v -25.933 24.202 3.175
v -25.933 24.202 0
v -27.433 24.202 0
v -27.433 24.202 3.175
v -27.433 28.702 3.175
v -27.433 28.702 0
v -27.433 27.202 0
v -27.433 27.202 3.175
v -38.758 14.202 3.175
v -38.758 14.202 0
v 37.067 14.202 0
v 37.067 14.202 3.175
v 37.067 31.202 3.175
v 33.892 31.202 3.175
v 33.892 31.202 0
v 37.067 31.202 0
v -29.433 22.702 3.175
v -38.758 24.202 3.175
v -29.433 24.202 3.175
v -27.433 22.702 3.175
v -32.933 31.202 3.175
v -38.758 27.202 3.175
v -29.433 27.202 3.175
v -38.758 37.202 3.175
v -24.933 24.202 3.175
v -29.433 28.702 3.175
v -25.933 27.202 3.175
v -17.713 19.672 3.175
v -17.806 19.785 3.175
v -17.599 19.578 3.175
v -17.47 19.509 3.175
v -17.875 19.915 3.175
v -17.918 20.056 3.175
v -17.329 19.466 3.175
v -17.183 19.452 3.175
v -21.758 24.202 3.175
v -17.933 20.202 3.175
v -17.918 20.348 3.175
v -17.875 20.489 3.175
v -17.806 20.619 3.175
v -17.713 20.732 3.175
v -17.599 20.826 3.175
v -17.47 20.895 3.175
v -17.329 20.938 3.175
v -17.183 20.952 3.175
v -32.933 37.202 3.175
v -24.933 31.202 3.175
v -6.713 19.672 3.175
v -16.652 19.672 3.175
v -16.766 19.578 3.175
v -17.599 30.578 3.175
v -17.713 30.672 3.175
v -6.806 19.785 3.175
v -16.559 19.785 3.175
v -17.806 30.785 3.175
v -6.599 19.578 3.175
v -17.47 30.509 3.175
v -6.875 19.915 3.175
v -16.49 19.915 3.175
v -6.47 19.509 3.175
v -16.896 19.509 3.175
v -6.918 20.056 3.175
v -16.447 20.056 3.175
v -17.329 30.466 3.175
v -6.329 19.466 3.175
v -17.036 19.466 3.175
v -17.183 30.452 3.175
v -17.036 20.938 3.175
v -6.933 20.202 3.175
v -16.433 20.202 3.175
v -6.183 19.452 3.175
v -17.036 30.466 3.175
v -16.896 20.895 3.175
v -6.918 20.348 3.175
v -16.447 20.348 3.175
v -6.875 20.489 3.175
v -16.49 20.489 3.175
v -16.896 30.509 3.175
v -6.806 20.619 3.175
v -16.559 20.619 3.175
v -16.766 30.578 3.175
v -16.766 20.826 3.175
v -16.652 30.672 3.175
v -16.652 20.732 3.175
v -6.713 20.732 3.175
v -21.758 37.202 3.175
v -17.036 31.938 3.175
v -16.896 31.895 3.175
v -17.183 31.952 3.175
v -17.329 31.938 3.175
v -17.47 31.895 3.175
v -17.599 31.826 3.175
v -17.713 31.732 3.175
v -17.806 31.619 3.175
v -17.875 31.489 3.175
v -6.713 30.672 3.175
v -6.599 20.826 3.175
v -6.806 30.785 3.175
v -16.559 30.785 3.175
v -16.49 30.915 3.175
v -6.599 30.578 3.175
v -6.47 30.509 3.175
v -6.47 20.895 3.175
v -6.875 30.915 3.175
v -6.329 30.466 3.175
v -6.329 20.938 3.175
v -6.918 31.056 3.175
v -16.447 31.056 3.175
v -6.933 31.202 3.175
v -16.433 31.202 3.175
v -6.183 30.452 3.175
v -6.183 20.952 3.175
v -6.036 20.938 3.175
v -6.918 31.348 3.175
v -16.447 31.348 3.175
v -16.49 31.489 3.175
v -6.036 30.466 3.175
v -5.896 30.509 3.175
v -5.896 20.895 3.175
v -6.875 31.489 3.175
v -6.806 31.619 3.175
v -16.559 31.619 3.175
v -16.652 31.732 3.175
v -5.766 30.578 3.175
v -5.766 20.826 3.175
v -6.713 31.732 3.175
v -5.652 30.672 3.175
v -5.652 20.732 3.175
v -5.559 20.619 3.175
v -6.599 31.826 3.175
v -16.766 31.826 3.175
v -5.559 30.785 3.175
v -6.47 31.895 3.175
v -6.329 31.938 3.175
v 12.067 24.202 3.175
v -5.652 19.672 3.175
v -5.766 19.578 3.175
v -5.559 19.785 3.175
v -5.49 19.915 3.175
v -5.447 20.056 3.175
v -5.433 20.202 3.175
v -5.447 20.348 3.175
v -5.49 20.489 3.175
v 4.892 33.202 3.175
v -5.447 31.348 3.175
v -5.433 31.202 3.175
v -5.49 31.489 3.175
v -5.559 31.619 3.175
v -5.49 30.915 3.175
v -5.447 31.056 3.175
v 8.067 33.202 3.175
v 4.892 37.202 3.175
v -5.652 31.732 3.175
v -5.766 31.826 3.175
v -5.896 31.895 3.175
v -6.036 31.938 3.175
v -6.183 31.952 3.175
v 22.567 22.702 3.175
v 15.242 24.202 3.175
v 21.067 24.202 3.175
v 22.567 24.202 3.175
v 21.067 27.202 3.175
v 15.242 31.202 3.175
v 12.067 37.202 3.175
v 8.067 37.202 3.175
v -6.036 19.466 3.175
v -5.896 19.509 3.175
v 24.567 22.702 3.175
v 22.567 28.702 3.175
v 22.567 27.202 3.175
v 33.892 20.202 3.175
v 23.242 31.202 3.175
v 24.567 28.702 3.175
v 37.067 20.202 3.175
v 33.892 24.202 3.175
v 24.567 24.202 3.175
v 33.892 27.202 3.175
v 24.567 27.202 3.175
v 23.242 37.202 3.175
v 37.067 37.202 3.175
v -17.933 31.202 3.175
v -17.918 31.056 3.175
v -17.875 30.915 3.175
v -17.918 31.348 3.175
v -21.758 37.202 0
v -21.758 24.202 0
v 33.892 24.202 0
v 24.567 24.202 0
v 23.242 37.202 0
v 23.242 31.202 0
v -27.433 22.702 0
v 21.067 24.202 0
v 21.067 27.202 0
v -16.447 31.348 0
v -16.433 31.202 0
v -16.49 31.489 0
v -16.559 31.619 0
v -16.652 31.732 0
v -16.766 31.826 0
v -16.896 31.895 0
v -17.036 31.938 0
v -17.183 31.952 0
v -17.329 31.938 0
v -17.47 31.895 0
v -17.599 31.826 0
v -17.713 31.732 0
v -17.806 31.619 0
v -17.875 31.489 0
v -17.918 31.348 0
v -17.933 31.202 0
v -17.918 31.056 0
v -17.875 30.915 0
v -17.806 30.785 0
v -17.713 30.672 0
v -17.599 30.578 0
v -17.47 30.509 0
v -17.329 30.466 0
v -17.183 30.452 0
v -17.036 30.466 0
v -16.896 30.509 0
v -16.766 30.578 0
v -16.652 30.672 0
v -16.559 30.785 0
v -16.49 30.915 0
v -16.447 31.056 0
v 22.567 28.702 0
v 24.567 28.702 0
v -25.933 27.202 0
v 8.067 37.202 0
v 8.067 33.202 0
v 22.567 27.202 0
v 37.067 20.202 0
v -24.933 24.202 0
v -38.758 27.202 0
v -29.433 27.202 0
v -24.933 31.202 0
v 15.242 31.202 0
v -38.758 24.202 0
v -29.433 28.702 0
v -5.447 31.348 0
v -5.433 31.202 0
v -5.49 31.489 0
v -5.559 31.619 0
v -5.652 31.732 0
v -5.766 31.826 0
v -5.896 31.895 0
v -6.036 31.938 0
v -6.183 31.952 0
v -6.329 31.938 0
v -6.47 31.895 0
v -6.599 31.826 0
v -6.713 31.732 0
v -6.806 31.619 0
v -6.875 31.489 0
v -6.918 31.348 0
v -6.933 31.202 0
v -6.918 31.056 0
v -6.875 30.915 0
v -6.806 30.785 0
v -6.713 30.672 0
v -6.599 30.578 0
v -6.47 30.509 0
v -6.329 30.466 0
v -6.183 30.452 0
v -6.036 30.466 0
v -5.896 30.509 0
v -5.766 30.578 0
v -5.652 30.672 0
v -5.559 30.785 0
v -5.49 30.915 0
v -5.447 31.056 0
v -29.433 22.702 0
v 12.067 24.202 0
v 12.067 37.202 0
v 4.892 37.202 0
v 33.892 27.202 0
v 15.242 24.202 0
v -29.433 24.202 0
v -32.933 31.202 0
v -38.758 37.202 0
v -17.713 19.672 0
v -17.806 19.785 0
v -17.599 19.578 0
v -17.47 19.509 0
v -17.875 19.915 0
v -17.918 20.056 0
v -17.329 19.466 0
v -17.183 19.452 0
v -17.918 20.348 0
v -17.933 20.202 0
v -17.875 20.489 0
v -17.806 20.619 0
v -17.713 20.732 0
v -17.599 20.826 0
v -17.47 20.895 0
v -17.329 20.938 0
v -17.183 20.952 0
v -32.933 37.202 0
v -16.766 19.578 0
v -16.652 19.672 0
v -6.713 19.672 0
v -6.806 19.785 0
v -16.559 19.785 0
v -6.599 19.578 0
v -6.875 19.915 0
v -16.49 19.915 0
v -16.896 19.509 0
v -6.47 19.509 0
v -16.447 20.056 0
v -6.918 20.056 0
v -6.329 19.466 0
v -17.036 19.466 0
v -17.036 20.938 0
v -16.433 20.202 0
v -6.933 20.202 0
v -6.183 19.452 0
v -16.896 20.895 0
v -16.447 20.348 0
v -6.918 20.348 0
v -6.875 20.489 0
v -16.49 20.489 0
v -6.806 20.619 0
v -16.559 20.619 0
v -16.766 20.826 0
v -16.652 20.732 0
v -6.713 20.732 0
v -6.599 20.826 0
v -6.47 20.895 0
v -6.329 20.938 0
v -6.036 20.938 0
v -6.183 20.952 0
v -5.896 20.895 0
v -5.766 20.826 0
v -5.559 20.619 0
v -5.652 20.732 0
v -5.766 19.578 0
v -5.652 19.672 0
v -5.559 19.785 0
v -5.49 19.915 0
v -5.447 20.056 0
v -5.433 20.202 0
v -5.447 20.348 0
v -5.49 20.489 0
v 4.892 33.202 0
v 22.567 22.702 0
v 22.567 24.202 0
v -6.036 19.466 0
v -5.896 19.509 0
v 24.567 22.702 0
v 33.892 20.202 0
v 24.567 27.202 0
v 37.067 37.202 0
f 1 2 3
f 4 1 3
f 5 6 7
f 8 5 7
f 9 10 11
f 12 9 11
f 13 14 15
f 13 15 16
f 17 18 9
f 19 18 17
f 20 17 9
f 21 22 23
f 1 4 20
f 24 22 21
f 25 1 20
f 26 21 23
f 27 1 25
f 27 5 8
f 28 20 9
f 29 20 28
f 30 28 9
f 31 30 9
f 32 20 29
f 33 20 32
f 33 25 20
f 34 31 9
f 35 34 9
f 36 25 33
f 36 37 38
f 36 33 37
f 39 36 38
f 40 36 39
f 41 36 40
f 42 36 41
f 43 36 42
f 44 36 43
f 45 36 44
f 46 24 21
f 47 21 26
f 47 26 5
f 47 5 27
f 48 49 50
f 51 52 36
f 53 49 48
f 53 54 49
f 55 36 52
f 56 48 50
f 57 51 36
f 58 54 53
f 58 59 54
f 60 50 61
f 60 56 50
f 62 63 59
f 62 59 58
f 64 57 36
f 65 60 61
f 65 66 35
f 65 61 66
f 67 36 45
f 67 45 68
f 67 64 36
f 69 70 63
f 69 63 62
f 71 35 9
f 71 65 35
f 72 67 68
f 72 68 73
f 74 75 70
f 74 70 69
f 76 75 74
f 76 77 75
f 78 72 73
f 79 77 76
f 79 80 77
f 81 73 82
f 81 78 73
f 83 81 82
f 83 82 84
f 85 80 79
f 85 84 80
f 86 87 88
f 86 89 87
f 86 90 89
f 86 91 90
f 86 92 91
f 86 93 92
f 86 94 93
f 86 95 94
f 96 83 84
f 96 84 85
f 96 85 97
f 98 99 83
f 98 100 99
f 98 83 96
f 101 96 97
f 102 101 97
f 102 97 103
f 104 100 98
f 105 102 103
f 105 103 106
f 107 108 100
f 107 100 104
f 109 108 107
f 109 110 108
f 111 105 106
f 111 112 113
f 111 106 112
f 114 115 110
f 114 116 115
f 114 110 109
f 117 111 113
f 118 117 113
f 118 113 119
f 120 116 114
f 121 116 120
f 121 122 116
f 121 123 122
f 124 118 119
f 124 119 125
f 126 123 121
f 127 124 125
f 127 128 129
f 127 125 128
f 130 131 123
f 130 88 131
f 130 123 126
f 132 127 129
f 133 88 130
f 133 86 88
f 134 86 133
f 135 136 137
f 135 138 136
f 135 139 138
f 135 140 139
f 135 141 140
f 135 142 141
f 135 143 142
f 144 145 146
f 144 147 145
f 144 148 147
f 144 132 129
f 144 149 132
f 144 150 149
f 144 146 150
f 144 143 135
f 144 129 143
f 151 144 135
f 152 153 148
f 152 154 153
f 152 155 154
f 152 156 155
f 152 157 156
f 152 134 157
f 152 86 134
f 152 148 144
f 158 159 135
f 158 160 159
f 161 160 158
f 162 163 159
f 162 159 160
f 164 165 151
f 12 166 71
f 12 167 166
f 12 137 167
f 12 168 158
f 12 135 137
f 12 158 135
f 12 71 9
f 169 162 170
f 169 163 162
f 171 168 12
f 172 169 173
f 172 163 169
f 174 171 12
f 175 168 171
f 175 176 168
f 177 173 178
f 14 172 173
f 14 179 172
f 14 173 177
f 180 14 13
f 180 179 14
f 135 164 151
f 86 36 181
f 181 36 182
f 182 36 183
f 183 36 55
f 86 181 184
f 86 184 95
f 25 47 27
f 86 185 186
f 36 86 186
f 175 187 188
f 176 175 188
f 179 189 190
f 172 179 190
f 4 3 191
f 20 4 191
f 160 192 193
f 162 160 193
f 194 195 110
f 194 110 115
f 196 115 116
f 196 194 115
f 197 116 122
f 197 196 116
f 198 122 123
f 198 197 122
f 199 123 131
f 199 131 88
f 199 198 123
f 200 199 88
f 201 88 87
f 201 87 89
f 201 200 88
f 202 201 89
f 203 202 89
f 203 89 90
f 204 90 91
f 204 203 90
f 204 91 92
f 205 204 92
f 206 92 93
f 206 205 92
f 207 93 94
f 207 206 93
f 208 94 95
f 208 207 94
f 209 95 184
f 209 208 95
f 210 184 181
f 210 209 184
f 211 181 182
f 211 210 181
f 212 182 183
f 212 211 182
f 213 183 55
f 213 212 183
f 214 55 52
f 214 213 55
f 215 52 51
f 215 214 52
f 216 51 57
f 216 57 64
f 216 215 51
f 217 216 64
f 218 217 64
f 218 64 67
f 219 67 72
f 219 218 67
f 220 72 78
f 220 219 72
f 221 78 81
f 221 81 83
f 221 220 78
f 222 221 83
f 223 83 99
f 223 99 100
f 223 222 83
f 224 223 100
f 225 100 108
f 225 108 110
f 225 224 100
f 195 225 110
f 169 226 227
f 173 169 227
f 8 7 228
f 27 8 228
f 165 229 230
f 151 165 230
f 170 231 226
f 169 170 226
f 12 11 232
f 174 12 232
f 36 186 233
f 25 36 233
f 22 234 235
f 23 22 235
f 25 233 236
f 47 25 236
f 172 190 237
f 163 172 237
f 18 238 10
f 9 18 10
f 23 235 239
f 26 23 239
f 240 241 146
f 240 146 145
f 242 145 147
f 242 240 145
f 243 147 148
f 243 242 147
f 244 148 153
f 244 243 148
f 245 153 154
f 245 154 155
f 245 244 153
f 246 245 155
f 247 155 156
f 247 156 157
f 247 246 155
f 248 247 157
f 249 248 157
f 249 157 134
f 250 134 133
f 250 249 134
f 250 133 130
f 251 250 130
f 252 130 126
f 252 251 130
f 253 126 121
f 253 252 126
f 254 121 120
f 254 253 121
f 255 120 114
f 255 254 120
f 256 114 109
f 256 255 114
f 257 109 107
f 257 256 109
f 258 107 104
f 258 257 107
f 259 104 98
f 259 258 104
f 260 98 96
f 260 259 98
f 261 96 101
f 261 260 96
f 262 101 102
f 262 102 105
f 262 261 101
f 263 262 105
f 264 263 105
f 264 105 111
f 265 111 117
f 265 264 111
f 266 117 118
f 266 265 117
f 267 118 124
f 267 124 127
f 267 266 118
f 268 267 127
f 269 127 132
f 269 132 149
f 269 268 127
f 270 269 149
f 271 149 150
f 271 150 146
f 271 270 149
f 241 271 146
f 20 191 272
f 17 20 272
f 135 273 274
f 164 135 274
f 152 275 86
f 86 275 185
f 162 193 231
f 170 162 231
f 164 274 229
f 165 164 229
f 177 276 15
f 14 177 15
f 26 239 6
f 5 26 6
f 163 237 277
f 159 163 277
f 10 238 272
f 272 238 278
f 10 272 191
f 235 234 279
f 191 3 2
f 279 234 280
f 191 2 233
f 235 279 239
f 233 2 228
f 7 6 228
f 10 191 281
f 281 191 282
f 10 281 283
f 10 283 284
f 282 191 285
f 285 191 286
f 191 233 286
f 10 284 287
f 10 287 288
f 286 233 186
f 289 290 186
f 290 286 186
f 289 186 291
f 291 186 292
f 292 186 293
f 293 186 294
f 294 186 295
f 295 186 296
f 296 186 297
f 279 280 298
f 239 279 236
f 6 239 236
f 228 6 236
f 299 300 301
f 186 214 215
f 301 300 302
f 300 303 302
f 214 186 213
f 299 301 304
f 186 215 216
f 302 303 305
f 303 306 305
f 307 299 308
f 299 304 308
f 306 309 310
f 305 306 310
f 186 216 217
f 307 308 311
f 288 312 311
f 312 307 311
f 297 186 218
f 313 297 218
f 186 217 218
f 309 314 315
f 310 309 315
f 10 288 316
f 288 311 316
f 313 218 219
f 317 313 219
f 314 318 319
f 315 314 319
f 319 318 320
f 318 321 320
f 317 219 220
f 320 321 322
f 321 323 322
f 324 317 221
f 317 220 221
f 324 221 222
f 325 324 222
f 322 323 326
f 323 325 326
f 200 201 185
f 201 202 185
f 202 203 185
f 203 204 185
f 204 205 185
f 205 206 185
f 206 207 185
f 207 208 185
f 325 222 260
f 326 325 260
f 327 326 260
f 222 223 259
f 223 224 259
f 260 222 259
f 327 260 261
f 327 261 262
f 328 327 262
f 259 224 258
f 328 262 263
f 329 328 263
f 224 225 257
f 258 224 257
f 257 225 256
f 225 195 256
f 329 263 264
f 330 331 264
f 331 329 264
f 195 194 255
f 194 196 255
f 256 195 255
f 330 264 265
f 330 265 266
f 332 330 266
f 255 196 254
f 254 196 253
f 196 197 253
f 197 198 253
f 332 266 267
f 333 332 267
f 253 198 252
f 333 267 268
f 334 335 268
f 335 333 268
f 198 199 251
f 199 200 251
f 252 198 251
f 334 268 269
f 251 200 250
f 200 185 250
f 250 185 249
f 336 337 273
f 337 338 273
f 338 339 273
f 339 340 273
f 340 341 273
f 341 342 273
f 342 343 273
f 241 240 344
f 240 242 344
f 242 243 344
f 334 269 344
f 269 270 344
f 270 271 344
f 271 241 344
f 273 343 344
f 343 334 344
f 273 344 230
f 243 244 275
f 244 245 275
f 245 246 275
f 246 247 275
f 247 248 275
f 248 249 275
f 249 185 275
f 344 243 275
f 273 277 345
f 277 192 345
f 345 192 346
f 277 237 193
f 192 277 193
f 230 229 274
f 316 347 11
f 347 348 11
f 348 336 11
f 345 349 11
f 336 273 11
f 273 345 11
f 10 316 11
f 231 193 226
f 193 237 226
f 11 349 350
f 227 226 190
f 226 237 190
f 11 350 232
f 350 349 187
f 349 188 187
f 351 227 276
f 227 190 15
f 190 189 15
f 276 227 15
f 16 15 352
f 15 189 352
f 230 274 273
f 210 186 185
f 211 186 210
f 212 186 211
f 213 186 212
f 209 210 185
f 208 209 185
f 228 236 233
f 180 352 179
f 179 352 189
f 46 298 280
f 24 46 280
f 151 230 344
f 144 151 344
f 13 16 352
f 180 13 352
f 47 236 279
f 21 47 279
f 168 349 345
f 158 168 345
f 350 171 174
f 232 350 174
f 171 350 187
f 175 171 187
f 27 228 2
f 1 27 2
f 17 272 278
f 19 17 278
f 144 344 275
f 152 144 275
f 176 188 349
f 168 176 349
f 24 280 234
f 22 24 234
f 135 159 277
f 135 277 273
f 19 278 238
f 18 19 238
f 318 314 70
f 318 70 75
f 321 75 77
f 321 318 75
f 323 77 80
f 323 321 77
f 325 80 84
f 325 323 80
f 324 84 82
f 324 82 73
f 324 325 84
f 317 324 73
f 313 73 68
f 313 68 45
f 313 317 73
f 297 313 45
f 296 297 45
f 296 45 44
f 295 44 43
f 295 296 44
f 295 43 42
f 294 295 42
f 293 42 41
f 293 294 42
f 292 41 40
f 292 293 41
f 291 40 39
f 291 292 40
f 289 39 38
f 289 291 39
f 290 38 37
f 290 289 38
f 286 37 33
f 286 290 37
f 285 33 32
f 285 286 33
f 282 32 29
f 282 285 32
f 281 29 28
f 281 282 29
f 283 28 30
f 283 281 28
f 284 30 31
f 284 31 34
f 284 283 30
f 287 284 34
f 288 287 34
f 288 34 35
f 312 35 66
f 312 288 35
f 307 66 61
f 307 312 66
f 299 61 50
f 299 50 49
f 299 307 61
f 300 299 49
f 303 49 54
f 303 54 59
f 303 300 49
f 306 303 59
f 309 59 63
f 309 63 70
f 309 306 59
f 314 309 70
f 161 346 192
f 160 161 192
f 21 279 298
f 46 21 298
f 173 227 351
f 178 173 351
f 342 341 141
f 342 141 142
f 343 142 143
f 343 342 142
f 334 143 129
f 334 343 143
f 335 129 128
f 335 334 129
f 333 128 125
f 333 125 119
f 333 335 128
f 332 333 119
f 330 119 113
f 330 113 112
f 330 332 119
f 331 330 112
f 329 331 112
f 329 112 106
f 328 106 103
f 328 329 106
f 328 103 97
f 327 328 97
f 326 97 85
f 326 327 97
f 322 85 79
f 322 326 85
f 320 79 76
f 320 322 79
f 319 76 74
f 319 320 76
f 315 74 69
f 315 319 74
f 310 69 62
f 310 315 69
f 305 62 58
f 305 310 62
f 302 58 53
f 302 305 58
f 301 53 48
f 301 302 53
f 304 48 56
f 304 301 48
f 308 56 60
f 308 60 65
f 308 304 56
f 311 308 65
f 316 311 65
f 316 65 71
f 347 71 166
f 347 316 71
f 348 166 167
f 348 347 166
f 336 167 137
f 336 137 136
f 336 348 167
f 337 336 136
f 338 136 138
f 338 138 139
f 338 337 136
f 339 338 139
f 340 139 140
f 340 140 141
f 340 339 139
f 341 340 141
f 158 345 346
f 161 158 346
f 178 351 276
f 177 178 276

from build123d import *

# Parameters (mm, degrees)
F0_R     = 0.75
F0_W     = 3.175
F0_H     = 6
F1_DEPTH = 3.175


# Not quite as in the source:
# - a length typed as a fraction of an inch, garbled in the dataset ("3 / 203.2 mm" for 3/8 in), is restored


with BuildPart() as f1:
    # F0 (on Top) → F1 (new body)
    with BuildSketch(Plane.XY):
        Polygon((21.0674113333, 24.2020648569), (21.0674113333, 27.2020648569), (22.5674113333, 27.2020648569), (22.5674113333, 28.7020648569), (24.5674113333, 28.7020648569), (24.5674113333, 27.2020648569), (33.8924113333, 27.2020648569), (33.8924113333, 31.2020648569), (33.8924113333, 37.2020648569), (23.2424113333, 37.2020648569), (23.2424113333, 31.2020648569), (15.2424113333, 31.2020648569), (15.2424113333, 24.2020648569), (12.0674113333, 24.2020648569), (12.0674113333, 37.2020648569), (8.0674113333, 37.2020648569), (8.0674113333, 33.2020648569), (4.8924113333, 33.2020648569), (4.8924113333, 37.2020648569), (-21.7575886667, 37.2020648569), (-21.7575886667, 24.2020648569), (-24.9325886667, 24.2020648569), (-24.9325886667, 31.2020648569), (-32.9325886667, 31.2020648569), (-32.9325886667, 37.2020648569), (-38.7575886667, 37.2020648569), (-38.7575886667, 31.2020648569), (-38.7575886667, 27.2020648569), (-29.4325886667, 27.2020648569), (-29.4325886667, 28.7020648569), (-27.4325886667, 28.7020648569), (-27.4325886667, 27.2020648569), (-25.9325886667, 27.2020648569), (-25.9325886667, 24.2020648569), (-27.4325886667, 24.2020648569), (-27.4325886667, 22.7020648569), (-29.4325886667, 22.7020648569), (-29.4325886667, 24.2020648569), (-38.7575886667, 24.2020648569), (-38.7575886667, 20.2020648569), (-38.7575886667, 14.2020648569), (33.8924113333, 14.2020648569), (33.8924113333, 20.2020648569), (33.8924113333, 24.2020648569), (24.5674113333, 24.2020648569), (24.5674113333, 22.7020648569), (22.5674113333, 22.7020648569), (22.5674113333, 24.2020648569), align=None)
        with Locations((-17.1825886667, 20.2020648569)):
            Circle(F0_R, mode=Mode.SUBTRACT)
        with Locations((-6.1825886667, 20.2020648569)):
            Circle(F0_R, mode=Mode.SUBTRACT)
        with Locations((-17.1825886667, 31.2020648569)):
            Circle(F0_R, mode=Mode.SUBTRACT)
        with Locations((-6.1825886667, 31.2020648569)):
            Circle(F0_R, mode=Mode.SUBTRACT)
        with Locations((35.4799113333, 34.2020648569)):
            Rectangle(F0_W, F0_H)
        with Locations((35.4799113333, 17.2020648569)):
            Rectangle(F0_W, F0_H)
    extrude(amount=F1_DEPTH)


solid = f1.part
